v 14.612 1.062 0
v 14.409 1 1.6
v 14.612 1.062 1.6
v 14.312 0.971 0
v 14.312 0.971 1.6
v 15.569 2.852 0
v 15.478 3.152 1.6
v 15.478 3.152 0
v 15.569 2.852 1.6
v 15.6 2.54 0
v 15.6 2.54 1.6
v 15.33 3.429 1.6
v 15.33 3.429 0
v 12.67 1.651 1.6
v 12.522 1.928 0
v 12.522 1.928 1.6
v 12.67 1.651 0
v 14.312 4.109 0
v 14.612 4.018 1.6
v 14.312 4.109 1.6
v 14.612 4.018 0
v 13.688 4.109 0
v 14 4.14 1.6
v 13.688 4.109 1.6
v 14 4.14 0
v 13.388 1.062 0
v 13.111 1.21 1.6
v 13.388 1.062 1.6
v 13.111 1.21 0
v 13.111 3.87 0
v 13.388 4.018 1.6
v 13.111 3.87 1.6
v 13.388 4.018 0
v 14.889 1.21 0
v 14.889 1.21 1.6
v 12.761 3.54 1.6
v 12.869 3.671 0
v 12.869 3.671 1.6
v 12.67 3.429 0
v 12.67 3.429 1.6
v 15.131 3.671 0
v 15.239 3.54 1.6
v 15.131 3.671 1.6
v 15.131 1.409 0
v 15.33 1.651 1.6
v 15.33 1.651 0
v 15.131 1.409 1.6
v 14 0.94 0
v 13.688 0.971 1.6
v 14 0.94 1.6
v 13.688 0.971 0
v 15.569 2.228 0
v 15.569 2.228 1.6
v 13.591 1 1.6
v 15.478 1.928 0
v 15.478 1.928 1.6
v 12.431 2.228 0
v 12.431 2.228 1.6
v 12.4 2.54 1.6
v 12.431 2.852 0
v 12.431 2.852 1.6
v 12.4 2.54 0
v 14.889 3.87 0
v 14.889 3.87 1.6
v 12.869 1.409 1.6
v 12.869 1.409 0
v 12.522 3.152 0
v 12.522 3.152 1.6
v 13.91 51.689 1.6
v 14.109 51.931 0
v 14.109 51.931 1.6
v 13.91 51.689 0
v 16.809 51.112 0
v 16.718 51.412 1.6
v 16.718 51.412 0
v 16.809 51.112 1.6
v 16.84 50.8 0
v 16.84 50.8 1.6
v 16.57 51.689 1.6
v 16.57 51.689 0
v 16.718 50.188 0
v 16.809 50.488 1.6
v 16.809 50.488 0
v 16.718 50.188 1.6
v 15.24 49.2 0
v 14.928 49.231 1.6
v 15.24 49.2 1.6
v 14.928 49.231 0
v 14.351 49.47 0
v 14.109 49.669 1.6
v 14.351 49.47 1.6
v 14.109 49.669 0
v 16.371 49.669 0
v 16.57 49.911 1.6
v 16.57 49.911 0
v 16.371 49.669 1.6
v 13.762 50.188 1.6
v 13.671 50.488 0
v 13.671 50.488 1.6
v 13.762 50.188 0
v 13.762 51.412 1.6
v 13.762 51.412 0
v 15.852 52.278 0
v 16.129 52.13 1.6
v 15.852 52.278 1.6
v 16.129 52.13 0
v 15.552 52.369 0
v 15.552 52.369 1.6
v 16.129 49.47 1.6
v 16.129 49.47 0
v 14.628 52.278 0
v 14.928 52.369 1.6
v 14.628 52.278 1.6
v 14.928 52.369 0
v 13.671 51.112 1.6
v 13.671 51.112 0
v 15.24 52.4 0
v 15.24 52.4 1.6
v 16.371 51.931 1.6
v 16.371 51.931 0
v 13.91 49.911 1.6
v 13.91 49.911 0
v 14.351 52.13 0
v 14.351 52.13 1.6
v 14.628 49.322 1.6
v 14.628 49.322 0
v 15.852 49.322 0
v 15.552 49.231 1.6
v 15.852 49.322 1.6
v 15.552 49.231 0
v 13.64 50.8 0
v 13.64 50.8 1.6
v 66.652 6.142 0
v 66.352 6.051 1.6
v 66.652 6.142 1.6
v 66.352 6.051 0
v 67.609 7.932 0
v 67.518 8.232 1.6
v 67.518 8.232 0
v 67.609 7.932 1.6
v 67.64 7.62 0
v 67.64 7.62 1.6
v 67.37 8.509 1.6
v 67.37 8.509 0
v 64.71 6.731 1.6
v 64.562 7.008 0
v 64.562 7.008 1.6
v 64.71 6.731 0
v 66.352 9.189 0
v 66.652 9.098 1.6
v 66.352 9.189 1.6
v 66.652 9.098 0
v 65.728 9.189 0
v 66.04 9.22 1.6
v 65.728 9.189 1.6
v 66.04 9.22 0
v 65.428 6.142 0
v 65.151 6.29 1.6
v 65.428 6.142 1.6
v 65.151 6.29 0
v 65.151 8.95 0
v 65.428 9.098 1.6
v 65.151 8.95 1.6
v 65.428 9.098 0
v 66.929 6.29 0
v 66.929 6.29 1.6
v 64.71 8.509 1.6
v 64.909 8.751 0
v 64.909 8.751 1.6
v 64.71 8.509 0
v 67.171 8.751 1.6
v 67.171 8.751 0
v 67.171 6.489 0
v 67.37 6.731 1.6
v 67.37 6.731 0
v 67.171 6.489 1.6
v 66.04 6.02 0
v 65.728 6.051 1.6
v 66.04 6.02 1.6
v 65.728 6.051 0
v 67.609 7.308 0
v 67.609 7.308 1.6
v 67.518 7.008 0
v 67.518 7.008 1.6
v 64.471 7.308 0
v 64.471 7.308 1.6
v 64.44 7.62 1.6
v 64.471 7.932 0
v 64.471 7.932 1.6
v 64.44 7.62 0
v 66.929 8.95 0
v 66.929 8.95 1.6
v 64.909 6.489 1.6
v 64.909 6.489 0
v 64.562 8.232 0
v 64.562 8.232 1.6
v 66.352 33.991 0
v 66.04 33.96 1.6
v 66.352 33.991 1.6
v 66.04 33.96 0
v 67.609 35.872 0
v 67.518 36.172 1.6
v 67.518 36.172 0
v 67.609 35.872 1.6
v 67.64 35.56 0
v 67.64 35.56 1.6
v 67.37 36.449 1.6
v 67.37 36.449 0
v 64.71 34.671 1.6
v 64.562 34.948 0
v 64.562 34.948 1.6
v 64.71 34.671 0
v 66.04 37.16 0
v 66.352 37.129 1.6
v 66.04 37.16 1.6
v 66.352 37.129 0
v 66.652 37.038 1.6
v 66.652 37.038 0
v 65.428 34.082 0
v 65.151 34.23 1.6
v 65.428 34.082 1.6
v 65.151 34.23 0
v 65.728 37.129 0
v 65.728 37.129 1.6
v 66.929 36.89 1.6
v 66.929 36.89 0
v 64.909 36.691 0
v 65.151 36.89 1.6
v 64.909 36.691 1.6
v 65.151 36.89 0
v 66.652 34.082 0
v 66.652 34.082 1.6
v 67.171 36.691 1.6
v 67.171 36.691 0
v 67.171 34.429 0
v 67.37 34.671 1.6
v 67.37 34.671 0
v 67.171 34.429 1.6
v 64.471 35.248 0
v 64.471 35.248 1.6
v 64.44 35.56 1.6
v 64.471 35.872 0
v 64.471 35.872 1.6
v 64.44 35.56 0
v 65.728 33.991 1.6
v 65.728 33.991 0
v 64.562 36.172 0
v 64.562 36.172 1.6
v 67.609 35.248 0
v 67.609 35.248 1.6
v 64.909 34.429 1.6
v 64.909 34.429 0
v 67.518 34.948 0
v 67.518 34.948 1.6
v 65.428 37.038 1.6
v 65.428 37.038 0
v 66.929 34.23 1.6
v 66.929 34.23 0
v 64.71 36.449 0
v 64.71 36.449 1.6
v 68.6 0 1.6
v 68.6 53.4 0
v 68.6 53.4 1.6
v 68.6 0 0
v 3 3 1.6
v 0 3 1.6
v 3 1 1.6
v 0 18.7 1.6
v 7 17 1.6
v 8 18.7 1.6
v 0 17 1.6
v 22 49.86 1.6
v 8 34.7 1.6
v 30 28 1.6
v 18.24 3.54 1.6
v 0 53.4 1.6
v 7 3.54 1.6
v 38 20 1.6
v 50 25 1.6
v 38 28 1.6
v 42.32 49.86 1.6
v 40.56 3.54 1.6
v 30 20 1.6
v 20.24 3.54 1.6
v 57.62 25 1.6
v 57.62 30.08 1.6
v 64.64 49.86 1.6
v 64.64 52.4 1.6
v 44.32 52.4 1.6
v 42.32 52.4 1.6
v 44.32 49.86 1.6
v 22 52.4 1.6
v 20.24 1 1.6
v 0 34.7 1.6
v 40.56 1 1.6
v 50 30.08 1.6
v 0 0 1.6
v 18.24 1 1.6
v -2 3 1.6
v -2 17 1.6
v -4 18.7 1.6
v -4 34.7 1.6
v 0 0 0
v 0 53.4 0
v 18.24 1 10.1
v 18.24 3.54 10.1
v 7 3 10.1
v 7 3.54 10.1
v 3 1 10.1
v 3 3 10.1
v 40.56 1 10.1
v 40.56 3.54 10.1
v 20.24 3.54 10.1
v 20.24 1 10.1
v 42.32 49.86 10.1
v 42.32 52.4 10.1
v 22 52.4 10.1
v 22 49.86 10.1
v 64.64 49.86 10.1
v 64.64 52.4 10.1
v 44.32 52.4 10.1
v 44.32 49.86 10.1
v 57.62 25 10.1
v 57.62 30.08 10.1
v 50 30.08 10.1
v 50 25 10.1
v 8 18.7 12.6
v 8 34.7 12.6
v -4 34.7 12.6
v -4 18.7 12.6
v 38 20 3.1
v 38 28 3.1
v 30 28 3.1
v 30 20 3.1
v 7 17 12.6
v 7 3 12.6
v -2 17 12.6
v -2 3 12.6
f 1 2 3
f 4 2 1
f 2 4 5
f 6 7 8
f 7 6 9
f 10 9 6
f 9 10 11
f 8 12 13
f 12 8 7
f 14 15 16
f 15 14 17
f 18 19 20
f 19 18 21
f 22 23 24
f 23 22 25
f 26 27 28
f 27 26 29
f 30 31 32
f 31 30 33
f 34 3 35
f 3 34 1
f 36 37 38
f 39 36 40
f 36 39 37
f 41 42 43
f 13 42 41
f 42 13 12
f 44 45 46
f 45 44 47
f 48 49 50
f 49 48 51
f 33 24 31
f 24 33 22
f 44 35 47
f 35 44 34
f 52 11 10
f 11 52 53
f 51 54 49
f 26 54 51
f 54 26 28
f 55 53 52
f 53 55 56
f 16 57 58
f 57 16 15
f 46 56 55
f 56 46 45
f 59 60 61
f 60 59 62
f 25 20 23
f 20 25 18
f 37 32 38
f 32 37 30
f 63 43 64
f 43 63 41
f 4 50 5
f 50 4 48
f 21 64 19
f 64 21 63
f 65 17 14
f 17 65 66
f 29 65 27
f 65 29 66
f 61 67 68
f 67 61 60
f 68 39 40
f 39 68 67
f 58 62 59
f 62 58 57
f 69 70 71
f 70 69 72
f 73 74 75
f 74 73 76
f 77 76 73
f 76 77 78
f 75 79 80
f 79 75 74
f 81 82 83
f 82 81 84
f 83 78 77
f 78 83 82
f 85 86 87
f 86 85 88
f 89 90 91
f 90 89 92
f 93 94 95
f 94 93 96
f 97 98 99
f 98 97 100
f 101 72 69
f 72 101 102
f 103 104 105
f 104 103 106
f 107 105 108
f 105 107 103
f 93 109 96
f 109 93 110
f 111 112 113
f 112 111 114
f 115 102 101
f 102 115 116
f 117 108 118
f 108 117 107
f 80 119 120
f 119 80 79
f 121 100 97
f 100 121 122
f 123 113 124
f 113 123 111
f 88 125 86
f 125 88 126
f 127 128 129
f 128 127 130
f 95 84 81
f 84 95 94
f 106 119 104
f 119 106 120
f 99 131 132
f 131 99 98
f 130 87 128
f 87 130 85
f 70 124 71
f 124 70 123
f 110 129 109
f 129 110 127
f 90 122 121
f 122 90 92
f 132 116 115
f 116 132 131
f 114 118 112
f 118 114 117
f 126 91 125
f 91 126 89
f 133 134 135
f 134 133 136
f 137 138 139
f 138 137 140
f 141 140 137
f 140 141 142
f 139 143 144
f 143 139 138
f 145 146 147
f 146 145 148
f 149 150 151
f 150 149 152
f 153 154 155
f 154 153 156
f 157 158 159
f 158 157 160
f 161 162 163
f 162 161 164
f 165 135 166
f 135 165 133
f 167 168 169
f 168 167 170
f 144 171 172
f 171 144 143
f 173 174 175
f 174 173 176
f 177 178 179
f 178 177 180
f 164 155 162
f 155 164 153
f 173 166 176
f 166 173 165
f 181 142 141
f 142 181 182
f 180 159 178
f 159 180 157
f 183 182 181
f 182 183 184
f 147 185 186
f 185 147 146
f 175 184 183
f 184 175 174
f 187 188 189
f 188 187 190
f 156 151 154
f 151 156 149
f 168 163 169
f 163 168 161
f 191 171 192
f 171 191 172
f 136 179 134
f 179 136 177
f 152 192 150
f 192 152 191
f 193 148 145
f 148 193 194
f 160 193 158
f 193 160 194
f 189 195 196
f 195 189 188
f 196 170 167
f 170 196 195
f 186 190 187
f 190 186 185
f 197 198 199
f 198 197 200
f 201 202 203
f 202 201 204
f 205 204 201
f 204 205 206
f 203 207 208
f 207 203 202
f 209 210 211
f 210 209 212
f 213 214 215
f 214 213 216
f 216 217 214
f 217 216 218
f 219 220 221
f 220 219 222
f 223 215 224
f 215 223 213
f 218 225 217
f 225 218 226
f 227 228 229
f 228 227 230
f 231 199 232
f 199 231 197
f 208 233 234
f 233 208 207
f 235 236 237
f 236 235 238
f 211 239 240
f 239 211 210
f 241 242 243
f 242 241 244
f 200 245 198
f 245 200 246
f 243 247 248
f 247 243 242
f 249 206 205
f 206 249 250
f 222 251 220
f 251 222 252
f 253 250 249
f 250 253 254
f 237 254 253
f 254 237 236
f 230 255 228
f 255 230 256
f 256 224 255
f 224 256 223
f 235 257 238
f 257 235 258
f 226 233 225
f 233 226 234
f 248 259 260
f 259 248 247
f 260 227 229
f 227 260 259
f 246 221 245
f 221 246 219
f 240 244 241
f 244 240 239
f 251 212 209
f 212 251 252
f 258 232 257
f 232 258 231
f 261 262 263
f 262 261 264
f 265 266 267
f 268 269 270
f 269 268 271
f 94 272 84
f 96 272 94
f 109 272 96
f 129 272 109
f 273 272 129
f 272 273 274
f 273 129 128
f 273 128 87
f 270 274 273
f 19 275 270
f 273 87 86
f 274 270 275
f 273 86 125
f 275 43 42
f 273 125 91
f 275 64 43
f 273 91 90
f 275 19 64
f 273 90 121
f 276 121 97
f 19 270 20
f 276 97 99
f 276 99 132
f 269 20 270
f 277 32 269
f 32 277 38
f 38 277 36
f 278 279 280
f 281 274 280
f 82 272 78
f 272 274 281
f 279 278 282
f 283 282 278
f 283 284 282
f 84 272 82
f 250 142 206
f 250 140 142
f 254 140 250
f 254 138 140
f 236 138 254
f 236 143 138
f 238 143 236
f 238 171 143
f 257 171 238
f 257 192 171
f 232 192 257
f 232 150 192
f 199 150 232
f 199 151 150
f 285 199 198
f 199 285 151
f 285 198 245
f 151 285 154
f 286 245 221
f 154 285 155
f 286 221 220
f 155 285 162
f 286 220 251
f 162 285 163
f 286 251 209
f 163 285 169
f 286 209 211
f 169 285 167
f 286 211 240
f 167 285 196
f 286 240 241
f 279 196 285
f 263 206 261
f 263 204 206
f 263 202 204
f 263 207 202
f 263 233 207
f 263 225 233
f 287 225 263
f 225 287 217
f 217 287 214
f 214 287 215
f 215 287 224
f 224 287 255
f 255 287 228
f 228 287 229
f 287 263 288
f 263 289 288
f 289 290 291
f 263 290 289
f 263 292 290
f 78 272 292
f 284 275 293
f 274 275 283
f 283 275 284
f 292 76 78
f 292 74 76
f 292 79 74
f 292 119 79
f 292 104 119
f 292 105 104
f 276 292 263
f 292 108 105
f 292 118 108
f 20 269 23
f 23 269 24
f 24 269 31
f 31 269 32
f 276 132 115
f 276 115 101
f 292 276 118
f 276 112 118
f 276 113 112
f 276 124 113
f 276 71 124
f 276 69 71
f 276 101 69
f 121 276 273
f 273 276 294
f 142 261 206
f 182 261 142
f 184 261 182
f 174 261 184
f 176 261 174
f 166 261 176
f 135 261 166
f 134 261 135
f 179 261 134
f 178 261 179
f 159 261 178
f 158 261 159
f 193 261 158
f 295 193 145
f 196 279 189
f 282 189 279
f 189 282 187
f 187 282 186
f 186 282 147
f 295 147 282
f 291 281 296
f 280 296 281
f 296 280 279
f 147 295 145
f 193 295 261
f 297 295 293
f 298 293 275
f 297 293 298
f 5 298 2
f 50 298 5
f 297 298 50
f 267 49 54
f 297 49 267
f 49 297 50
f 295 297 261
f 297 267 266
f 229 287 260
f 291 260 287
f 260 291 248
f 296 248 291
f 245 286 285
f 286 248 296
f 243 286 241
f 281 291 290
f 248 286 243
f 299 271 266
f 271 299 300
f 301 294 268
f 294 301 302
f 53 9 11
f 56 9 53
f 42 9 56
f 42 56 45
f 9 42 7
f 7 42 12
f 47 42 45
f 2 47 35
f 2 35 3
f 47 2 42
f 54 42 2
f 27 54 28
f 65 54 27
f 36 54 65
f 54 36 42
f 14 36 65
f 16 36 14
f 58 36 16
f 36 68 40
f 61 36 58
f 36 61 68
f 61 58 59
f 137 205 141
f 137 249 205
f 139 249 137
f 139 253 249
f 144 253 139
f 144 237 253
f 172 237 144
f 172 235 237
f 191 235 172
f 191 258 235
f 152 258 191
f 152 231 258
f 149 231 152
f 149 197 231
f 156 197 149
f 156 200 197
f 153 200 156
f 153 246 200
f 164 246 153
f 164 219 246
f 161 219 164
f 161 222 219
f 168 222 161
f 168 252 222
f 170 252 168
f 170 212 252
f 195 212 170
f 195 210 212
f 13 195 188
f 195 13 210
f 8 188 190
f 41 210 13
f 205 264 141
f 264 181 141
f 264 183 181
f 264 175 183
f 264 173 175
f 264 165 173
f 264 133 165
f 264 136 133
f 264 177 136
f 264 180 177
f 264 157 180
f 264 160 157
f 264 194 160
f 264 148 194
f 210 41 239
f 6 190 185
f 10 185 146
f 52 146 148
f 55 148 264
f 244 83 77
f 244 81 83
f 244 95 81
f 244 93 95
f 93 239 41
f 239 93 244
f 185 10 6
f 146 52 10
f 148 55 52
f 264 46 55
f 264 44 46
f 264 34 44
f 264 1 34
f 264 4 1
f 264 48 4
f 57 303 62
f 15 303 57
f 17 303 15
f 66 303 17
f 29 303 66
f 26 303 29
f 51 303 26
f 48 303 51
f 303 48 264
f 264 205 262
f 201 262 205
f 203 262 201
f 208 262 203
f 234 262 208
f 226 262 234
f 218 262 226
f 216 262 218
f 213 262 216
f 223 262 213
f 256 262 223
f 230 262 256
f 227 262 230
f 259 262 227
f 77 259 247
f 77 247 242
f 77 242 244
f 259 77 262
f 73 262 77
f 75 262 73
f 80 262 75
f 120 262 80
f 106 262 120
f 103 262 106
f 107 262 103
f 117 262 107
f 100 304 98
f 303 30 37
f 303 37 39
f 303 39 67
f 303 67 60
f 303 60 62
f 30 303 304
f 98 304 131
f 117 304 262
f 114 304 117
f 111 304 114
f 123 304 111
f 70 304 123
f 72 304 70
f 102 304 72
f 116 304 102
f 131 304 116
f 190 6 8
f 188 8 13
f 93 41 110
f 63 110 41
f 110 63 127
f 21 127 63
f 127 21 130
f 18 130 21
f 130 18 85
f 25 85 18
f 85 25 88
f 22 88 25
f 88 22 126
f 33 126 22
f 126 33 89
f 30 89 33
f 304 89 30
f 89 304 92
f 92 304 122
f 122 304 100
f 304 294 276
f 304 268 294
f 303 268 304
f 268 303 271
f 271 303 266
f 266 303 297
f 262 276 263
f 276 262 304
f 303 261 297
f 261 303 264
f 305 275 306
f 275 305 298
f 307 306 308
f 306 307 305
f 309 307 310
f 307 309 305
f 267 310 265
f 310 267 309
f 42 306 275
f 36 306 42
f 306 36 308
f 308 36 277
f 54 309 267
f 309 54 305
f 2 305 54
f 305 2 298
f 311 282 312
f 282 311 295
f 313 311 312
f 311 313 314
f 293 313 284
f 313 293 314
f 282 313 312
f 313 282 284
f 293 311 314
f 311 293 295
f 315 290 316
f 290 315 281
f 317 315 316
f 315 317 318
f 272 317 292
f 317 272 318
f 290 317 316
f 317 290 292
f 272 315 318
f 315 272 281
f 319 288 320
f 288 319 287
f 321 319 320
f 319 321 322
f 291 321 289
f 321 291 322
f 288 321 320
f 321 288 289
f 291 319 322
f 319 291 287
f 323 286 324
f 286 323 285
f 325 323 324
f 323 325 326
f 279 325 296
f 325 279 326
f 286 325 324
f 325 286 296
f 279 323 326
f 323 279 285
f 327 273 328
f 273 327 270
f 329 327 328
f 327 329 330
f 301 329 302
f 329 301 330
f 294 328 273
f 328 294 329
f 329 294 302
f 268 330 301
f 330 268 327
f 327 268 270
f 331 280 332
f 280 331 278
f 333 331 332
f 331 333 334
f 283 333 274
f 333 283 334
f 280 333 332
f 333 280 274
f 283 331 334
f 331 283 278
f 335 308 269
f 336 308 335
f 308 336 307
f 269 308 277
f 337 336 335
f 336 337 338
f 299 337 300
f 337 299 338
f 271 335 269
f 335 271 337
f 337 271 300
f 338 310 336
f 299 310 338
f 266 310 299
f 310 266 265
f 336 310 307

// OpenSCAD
$fn = 32;
pcb_w = 68.6; pcb_h = 53.4; pcb_t = 1.6;
hole_d = 3.2;

// PCB
color("green") difference() {
    cube([pcb_w, pcb_h, pcb_t]);
    for (p = [[14.0, 2.54], [15.24, 50.8], [66.04, 7.62], [66.04, 35.56]])
        translate([p[0], p[1], -0.1]) cylinder(d=hole_d, h=pcb_t+0.2);
}

// Analog headers (left side): 6-pin + 8-pin
color([0.2,0.2,0.2]) {
    translate([3.0, 1.0, pcb_t]) cube([6*2.54, 2.54, 8.5]);
    translate([3.0+6*2.54+2.0, 1.0, pcb_t]) cube([8*2.54, 2.54, 8.5]);
}

// Digital headers (right side): 8-pin + 8-pin
color([0.2,0.2,0.2]) {
    translate([22.0, pcb_h-3.54, pcb_t]) cube([8*2.54, 2.54, 8.5]);
    translate([22.0+8*2.54+2.0, pcb_h-3.54, pcb_t]) cube([8*2.54, 2.54, 8.5]);
}

// ICSP 2x3 header
color([0.2,0.2,0.2]) translate([50.0, 25.0, pcb_t]) cube([3*2.54, 2*2.54, 8.5]);

// USB-B connector
color("silver") translate([-4.0, (pcb_h-16)/2, pcb_t]) cube([12, 16, 11]);

// ATmega328P
color([0.1,0.1,0.1]) translate([30.0, 20.0, pcb_t]) cube([8, 8, 1.5]);

// Power barrel jack
color([0.2,0.2,0.2]) translate([-2.0, 3.0, pcb_t]) cube([9, 14, 11]);
